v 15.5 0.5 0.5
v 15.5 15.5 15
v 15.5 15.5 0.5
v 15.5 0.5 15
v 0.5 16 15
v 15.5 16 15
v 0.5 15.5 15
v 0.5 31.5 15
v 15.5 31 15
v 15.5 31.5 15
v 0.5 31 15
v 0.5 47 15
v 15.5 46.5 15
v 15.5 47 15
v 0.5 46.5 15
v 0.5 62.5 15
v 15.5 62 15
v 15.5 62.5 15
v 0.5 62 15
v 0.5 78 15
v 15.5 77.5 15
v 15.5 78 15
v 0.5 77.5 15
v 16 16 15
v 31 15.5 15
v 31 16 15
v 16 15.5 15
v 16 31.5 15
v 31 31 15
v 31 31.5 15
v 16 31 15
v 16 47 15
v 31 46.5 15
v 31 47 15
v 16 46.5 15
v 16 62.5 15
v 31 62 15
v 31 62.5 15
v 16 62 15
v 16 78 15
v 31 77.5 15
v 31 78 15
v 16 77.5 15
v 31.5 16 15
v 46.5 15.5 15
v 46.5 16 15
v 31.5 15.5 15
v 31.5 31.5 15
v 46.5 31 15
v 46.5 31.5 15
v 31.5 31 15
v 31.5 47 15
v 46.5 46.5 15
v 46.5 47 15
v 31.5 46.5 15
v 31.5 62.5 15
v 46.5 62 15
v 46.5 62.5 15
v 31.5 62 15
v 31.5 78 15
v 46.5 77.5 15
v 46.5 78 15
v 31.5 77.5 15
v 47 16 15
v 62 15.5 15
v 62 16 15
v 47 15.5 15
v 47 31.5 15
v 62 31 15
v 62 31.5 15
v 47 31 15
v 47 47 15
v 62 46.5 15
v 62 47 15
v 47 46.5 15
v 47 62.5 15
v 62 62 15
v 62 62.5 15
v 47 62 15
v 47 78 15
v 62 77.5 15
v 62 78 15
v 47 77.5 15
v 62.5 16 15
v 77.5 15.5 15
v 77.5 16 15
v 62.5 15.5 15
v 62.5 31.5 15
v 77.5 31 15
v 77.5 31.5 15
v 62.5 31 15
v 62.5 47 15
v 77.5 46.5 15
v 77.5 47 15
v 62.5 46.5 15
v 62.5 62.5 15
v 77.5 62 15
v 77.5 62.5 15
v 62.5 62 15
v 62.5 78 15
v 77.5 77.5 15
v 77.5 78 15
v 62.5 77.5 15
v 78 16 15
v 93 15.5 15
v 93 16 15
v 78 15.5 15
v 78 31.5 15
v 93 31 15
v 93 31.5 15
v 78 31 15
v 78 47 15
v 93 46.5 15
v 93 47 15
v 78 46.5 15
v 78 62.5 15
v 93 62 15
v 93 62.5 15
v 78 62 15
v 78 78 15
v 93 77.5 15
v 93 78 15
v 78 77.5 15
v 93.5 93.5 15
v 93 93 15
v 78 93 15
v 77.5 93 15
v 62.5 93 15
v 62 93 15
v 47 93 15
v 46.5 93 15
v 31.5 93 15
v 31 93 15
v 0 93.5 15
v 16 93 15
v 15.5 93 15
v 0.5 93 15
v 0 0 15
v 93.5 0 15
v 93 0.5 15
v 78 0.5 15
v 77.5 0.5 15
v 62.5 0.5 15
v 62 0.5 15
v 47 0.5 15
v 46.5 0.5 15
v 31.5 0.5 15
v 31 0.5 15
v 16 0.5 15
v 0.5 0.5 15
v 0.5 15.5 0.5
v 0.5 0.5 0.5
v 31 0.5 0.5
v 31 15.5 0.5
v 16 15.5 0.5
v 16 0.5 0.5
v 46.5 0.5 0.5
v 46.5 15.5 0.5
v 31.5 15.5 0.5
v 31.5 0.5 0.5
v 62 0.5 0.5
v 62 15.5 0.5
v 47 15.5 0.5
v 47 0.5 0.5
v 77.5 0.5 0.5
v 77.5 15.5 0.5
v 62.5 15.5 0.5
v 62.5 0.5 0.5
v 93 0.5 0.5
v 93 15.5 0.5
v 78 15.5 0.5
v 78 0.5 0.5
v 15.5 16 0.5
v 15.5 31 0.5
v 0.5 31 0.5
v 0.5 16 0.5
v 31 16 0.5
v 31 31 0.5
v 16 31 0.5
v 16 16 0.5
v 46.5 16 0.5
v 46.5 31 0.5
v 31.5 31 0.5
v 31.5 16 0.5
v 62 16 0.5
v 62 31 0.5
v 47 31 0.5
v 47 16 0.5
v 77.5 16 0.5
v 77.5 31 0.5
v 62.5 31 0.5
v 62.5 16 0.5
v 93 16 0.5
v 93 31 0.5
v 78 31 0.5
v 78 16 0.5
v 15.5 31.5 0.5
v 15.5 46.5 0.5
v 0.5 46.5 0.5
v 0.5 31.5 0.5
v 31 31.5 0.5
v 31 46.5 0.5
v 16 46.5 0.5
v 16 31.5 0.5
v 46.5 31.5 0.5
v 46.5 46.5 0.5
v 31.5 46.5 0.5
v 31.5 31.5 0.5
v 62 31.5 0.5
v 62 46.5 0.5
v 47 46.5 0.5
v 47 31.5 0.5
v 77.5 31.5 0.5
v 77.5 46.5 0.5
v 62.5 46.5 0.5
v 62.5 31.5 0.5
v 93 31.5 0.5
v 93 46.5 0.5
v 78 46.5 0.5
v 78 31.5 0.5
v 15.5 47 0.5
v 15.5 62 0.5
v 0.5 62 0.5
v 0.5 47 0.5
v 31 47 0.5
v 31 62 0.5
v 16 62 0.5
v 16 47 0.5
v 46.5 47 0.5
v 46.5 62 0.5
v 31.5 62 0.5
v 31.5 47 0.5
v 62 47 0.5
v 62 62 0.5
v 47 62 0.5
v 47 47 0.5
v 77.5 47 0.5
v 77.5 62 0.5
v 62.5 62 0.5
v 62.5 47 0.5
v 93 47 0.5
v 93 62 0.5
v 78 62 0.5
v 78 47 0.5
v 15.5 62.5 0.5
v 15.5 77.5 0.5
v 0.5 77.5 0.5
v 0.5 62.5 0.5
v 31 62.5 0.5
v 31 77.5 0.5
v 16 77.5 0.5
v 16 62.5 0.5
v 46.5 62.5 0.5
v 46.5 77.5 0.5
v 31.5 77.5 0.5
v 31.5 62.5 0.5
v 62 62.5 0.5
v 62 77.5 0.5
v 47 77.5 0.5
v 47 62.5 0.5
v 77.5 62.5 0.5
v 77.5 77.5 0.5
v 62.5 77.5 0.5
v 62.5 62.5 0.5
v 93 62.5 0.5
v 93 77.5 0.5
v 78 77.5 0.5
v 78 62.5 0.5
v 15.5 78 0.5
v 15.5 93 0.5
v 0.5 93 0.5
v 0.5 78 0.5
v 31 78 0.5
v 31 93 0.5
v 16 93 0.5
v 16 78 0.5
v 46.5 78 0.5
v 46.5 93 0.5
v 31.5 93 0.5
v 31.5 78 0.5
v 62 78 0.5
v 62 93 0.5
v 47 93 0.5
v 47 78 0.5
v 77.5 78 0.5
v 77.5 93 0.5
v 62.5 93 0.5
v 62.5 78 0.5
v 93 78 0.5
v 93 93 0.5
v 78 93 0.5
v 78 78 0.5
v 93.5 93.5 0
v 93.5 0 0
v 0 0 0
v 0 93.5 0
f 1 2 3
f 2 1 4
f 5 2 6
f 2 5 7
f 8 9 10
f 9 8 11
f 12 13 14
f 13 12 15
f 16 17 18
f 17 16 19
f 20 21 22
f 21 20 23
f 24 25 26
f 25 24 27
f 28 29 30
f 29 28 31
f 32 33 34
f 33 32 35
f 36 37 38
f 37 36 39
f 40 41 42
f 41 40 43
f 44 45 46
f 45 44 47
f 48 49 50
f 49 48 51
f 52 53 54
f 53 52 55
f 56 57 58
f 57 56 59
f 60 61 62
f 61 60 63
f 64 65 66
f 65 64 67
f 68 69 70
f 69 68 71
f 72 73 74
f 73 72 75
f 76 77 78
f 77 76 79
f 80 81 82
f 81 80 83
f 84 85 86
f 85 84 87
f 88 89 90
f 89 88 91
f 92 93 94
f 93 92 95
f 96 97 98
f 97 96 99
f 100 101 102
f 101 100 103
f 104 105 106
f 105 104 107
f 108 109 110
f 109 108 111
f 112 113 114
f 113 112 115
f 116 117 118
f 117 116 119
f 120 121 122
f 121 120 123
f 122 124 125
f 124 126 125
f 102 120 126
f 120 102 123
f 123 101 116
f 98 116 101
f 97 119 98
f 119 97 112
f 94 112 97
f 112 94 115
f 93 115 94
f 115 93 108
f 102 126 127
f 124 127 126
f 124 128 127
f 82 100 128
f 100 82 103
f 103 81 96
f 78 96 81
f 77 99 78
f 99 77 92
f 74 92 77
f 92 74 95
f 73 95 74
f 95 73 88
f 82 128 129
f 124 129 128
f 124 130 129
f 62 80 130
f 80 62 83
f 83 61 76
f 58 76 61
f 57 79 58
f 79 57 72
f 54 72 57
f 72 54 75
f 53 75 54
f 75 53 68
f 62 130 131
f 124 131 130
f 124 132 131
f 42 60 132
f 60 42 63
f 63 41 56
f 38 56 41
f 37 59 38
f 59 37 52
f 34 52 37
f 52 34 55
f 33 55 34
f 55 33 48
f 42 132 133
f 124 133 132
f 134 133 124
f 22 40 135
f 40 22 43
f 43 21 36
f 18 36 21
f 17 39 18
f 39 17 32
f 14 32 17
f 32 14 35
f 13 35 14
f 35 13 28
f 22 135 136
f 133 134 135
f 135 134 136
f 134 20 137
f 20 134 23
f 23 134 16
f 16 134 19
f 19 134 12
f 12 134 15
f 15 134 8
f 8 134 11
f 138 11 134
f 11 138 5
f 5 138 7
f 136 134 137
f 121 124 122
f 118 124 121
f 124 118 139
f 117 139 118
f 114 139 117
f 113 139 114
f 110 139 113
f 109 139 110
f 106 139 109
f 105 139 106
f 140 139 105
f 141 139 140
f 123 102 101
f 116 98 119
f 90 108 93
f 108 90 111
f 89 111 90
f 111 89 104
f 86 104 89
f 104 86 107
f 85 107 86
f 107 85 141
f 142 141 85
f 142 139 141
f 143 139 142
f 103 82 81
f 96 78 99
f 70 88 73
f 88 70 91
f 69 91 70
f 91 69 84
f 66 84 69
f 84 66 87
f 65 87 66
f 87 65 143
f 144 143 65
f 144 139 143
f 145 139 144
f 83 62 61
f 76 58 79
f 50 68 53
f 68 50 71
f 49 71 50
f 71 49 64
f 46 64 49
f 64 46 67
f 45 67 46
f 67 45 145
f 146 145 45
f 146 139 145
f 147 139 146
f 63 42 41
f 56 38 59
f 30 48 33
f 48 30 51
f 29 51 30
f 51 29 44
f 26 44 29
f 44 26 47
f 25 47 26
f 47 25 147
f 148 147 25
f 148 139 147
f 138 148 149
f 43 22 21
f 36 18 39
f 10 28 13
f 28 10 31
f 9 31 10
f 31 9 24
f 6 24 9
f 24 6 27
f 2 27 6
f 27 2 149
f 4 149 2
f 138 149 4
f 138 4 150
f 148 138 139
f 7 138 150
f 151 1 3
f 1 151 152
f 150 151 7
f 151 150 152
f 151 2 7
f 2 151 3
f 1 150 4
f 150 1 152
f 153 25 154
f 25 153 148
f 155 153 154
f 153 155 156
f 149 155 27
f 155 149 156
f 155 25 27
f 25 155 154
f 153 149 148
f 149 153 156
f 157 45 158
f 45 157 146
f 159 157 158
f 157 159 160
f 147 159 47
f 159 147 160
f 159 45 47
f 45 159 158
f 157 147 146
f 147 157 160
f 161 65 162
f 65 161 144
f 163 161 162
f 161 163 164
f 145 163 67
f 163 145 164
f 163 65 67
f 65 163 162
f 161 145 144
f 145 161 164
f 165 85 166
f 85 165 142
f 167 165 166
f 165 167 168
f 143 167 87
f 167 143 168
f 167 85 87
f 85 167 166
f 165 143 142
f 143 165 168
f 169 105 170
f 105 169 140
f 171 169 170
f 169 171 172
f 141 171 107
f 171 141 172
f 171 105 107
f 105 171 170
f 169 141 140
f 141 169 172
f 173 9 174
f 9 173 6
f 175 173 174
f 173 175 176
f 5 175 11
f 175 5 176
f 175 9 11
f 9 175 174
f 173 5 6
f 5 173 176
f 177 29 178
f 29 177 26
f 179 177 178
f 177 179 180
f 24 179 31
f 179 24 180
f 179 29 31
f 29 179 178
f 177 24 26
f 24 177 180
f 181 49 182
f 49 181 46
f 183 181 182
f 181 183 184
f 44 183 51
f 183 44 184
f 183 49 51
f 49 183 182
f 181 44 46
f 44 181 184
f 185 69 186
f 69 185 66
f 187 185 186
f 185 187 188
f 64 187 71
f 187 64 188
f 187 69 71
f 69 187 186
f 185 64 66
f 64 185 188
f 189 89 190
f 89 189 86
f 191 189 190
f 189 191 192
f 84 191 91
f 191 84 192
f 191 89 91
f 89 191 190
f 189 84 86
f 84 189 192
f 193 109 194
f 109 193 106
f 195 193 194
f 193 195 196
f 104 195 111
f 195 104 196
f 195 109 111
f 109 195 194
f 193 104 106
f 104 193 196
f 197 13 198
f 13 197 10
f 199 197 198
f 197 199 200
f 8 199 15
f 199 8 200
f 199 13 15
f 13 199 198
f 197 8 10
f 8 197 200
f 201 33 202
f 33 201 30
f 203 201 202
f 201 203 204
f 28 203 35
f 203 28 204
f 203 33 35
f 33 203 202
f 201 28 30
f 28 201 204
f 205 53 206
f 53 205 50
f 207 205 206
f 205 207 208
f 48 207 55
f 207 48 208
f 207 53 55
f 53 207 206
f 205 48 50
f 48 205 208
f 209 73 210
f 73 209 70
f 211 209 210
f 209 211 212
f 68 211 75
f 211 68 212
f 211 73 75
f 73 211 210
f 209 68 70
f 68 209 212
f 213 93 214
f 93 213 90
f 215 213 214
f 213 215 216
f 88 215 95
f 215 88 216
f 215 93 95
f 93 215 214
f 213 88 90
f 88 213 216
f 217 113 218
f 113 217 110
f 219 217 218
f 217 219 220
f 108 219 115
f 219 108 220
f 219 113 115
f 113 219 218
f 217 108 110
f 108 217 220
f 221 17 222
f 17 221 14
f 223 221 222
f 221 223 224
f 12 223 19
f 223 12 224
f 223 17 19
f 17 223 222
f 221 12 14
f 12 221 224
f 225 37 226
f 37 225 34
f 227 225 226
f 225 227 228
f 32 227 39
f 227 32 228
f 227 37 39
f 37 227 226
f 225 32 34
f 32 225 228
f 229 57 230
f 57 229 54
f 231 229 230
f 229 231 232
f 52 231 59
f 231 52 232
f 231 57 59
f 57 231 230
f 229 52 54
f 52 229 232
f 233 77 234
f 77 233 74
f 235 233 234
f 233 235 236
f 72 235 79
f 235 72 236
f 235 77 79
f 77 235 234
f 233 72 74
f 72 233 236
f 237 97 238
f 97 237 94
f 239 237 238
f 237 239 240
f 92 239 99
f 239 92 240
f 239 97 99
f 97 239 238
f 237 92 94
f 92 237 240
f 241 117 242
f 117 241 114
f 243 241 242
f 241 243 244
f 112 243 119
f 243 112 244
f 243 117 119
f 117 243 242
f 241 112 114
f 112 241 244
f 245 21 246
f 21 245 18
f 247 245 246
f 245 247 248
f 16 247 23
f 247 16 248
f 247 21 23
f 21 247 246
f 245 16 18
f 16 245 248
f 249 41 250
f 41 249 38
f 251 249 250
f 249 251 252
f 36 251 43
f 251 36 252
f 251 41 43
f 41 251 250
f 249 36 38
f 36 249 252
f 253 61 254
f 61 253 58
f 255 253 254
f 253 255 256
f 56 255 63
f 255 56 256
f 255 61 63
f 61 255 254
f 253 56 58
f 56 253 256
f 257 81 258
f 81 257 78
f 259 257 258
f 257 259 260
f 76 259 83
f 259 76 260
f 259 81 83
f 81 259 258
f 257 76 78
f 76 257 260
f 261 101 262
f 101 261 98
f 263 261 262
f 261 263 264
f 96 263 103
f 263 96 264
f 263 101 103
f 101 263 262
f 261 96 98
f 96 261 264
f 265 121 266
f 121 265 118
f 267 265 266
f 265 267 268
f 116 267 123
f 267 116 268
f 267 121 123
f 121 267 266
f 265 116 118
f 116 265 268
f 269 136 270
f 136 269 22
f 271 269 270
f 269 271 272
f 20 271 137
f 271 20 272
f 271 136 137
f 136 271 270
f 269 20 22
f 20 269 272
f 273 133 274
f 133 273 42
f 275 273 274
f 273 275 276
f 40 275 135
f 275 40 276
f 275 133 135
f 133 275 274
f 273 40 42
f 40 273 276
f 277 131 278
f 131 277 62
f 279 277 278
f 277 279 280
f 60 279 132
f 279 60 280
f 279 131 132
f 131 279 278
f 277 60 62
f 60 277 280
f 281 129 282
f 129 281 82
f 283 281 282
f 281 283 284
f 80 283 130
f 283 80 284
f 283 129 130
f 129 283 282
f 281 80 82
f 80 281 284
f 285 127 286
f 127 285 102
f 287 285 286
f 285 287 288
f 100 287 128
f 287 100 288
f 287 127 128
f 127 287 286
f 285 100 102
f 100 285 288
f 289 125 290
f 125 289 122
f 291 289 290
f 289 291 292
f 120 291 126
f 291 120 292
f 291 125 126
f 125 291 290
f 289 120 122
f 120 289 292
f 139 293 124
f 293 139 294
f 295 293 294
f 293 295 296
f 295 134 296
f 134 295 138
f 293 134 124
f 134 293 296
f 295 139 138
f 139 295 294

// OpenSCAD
//aa sizes = 14.0, 14.33, 14.25
aa_d = 14.3 + 0.7;
aaa_d = 10.3 + 0.7;

module holder(rows, cols, cell_d, wall_d=0.5, base_h=15)
{
    base_w = cols * (cell_d + wall_d) + wall_d;
    base_l = rows * (cell_d + wall_d) + wall_d;

    render(convexity = 2)

    difference()
    {
        cube([base_w, base_l, base_h]);

        union()
        {
            for(r = [0:rows-1])
            {
                for(c = [0:cols-1])
                {
                    x = c * (cell_d + wall_d) + wall_d;
                    y = r * (cell_d + wall_d) + wall_d;
                    translate([x, y, wall_d])
                    {
                        cube([cell_d, cell_d, base_h - wall_d]);
                    }
                }
            }
        }
    }
}

holder(6, 6, aa_d);
//rotate([0, 0, -90])
//holder(11, 2, aaa_d);
